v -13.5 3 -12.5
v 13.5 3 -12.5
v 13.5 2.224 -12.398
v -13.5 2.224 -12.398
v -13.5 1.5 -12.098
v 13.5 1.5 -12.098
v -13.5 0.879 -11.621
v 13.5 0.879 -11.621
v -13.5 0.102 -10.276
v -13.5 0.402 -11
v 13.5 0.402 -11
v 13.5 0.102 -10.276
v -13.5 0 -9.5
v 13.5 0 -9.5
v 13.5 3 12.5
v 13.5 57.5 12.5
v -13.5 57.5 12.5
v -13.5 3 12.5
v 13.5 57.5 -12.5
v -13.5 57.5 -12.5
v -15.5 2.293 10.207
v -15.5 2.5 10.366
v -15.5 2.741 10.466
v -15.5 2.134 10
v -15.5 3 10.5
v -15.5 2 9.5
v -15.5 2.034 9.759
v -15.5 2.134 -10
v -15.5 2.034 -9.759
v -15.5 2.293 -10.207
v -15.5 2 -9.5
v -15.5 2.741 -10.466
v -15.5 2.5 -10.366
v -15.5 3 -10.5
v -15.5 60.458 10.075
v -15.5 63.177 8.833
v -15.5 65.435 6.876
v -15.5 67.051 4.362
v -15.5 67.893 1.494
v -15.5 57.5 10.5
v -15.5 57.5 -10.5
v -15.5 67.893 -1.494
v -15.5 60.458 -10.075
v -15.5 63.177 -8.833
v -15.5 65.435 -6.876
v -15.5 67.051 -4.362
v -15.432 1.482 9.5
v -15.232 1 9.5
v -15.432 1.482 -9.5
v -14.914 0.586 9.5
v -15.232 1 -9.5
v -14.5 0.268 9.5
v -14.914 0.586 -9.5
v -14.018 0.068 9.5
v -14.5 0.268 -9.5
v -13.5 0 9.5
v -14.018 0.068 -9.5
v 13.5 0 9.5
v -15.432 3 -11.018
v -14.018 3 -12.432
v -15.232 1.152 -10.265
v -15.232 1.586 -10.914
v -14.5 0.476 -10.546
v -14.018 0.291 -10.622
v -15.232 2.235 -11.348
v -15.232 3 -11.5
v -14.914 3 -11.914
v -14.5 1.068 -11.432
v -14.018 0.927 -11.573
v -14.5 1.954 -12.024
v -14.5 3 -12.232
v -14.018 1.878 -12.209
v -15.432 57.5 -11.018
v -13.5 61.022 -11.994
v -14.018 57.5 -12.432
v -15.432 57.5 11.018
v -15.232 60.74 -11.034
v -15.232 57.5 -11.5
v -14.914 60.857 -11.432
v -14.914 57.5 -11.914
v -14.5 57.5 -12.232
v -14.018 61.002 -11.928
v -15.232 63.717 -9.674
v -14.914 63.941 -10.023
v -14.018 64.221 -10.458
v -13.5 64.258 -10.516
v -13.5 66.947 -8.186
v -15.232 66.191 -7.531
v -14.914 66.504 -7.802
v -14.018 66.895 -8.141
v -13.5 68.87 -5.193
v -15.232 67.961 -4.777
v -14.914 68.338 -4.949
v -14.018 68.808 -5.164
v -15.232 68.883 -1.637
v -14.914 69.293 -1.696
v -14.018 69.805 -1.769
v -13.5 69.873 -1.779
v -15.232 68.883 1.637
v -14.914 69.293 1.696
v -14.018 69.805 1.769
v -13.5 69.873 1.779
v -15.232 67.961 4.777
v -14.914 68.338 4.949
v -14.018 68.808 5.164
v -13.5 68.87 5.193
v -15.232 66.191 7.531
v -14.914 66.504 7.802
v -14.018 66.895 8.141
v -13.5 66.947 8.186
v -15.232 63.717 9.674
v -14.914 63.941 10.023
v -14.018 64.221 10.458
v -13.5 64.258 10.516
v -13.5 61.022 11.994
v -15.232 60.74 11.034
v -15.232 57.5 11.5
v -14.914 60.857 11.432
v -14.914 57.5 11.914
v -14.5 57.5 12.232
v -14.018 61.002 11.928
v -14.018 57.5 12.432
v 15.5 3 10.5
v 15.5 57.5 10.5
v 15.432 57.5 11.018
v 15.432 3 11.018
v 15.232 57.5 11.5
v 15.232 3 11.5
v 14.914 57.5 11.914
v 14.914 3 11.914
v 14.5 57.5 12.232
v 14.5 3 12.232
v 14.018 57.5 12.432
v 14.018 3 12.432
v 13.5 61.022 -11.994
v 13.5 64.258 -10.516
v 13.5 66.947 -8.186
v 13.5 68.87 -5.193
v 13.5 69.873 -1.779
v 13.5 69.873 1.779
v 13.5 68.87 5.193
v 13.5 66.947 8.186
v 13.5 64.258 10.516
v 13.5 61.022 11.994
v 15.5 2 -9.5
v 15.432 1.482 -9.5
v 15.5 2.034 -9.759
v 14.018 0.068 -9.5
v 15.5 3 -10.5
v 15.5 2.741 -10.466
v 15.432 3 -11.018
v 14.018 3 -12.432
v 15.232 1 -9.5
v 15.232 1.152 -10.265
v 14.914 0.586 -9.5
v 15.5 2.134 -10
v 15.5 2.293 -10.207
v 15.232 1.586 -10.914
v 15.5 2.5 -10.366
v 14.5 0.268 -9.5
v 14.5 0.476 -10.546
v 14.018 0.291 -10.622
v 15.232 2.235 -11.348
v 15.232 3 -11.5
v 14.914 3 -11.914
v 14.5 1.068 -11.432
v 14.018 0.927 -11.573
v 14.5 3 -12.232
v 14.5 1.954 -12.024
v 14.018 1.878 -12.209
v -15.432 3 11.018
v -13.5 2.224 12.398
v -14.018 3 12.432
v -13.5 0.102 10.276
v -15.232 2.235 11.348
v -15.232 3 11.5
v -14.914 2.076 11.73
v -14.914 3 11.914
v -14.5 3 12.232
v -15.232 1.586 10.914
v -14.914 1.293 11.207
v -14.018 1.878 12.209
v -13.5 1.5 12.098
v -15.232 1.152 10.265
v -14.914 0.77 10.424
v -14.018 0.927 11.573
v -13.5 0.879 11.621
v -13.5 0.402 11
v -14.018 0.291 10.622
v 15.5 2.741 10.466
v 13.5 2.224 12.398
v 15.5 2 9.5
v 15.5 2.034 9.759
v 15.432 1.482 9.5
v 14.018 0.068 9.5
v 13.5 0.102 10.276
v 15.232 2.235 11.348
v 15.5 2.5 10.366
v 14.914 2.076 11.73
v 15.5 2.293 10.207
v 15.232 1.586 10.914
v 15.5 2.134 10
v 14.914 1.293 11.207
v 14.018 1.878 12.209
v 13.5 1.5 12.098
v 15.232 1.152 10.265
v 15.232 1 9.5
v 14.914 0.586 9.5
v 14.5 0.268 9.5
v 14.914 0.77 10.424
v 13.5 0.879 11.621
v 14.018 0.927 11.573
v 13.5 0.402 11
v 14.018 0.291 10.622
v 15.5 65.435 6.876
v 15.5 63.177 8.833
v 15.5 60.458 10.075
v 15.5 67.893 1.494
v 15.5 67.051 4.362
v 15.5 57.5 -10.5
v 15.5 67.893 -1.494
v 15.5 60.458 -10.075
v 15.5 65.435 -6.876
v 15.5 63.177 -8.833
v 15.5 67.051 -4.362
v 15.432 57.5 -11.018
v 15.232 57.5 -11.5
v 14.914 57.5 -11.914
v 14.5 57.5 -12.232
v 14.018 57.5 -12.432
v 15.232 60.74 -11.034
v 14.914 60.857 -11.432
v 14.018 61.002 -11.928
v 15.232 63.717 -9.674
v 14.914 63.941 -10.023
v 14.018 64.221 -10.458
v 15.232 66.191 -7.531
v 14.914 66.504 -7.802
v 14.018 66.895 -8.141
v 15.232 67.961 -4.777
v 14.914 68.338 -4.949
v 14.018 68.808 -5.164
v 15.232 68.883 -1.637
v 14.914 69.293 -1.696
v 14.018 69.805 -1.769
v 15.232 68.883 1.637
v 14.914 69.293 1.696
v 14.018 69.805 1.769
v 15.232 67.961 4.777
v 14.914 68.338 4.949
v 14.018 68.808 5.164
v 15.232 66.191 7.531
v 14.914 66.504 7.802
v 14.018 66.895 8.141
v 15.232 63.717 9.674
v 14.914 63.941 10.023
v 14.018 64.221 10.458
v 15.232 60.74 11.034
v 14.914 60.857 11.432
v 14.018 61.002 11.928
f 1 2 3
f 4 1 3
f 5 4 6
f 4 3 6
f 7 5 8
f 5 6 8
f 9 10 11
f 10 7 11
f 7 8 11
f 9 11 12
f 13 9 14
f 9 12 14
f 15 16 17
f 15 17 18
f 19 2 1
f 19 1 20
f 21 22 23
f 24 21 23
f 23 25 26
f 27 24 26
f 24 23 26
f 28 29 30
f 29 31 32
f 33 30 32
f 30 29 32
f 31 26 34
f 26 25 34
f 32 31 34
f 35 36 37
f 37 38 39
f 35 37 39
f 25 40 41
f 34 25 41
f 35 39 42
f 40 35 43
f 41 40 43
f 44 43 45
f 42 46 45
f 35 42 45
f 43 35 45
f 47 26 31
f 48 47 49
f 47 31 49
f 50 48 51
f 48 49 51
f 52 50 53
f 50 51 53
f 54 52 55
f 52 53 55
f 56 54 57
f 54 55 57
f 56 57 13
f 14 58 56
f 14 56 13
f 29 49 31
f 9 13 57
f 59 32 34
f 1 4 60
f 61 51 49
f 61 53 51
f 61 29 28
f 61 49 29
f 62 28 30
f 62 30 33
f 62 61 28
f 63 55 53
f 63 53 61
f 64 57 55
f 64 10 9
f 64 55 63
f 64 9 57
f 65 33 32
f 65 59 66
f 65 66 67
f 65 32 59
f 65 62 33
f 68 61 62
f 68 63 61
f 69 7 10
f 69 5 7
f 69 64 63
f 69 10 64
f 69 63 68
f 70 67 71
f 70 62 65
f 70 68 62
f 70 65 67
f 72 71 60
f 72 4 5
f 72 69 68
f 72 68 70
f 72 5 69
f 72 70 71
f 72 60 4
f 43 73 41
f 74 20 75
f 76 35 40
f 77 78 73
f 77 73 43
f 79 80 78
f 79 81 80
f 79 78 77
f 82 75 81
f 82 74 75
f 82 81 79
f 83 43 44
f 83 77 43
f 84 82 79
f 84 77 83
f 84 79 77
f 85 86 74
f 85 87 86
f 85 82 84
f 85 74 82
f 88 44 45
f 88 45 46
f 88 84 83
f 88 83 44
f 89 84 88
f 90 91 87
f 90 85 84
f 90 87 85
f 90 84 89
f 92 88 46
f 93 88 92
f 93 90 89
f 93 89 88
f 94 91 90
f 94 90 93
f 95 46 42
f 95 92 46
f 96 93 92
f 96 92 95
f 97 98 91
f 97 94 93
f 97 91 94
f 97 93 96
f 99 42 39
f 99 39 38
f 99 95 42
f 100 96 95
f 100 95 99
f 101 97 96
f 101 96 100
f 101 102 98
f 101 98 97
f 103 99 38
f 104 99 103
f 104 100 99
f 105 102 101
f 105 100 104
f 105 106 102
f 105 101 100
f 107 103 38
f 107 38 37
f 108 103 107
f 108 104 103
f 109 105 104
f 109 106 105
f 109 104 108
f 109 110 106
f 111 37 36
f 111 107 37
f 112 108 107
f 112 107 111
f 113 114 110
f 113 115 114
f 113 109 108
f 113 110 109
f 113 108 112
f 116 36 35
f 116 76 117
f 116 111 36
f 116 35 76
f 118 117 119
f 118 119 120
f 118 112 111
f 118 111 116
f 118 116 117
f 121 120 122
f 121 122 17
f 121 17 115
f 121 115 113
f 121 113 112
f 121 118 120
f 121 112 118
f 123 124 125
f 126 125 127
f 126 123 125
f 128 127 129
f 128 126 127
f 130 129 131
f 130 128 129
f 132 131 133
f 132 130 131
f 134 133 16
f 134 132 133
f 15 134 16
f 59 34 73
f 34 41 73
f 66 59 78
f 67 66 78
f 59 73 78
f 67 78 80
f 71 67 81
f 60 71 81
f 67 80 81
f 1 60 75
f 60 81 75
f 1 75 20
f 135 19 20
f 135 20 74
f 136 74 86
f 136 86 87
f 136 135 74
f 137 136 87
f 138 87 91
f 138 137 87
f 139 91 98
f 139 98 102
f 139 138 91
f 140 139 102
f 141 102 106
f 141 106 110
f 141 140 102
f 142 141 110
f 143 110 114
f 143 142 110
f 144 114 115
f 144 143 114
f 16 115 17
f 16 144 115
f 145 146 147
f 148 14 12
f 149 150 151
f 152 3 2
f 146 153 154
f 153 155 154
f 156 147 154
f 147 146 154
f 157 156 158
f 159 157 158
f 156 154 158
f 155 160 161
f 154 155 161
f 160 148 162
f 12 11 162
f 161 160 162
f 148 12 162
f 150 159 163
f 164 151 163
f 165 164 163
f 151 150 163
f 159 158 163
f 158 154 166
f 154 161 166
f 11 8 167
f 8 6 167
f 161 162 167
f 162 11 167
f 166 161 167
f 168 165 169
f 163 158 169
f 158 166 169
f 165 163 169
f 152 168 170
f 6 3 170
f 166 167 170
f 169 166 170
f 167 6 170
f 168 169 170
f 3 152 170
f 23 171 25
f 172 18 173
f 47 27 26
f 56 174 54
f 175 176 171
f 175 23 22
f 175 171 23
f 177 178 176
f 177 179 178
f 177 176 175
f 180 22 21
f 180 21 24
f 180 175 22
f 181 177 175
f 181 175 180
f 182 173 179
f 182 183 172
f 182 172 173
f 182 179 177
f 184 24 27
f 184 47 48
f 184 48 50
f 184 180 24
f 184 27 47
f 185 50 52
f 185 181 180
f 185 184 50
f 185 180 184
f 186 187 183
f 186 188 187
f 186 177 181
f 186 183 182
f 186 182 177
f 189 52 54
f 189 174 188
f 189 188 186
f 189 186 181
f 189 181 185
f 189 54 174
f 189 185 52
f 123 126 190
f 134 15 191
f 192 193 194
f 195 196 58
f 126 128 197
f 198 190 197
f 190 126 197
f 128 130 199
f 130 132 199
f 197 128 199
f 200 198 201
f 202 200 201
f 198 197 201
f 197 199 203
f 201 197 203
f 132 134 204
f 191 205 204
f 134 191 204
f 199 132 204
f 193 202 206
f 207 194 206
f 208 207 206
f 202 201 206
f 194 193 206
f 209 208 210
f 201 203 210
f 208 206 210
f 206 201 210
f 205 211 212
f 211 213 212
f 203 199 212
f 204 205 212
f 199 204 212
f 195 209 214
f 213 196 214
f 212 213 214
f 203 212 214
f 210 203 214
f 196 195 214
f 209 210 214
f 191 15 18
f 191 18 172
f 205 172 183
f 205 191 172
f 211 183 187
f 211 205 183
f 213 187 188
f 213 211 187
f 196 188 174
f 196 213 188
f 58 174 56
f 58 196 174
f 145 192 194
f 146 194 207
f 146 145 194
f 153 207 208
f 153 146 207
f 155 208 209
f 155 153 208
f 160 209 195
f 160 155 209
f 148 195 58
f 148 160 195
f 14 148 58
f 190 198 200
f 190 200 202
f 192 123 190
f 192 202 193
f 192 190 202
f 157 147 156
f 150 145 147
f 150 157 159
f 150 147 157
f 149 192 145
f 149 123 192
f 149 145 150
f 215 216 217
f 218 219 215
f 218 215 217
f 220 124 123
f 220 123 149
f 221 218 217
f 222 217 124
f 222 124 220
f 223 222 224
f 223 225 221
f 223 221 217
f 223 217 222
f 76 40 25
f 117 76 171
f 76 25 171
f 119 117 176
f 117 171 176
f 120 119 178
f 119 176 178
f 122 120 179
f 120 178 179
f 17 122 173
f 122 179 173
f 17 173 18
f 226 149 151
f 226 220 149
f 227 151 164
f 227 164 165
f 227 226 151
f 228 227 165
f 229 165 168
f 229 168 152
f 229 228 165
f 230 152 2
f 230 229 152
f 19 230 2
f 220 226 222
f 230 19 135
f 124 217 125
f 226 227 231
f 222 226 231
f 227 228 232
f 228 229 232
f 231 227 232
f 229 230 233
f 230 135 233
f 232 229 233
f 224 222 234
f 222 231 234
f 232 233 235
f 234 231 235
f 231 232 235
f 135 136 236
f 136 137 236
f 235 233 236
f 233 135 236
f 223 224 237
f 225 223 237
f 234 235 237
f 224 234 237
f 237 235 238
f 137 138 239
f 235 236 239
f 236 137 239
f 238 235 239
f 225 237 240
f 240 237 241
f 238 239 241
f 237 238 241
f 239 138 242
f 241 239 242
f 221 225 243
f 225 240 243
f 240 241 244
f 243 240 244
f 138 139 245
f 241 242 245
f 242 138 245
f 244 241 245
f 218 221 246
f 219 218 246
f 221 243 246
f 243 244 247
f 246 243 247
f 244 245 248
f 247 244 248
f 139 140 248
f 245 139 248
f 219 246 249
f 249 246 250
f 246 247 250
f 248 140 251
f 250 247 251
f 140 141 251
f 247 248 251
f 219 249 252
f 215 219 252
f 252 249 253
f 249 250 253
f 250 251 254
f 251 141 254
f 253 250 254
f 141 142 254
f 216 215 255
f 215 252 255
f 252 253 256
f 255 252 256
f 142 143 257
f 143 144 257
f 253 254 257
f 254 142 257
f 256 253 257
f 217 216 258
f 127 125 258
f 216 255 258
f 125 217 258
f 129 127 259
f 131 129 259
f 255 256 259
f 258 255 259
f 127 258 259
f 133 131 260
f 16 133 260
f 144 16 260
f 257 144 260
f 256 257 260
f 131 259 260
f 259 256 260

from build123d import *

# Parameters (mm, degrees)
BOSS_EXTRUDE1_DEPTH = 15.5
FILLET1_R           = 3
FILLET2_R           = 2


with BuildPart() as part:
    # Sketch1 → Boss-Extrude1 (new, symmetric)
    with BuildSketch(Plane(origin=(0, 0, 0), x_dir=(0, 0, -1), z_dir=(1, 0, 0))):
        with BuildLine():
            Line((-12.5, 57.5), (-12.5, 0))
            Line((-12.5, 0), (12.5, 0))
            Line((12.5, 0), (12.5, 57.5))
            ThreePointArc((12.5, 57.5), (0, 70), (-12.5, 57.5))
        make_face()
    extrude(amount=BOSS_EXTRUDE1_DEPTH, both=True)

    # Fillet1
    fillet1_edges = [part.edges().sort_by_distance(p)[0] for p in [
        (0, 0, -12.5),
        (0, 0, 12.5),
    ]]
    fillet(fillet1_edges, radius=FILLET1_R)

    # Fillet2
    fillet2_edges = [part.edges().sort_by_distance(p)[0] for p in [
        (-15.5, 30.25, -12.5),
        (15.5, 30.25, -12.5),
        (-15.5, 0, 0),
        (-15.5, 0.878679656, 11.621320344),
        (-15.5, 0.878679656, -11.621320344),
        (15.5, 0, 0),
        (15.5, 0.878679656, 11.621320344),
        (15.5, 0.878679656, -11.621320344),
        (15.5, 70, 0),
        (-15.5, 30.25, 12.5),
        (-15.5, 70, 0),
        (15.5, 30.25, 12.5),
    ]]
    fillet(fillet2_edges, radius=FILLET2_R)


solid = part.part
